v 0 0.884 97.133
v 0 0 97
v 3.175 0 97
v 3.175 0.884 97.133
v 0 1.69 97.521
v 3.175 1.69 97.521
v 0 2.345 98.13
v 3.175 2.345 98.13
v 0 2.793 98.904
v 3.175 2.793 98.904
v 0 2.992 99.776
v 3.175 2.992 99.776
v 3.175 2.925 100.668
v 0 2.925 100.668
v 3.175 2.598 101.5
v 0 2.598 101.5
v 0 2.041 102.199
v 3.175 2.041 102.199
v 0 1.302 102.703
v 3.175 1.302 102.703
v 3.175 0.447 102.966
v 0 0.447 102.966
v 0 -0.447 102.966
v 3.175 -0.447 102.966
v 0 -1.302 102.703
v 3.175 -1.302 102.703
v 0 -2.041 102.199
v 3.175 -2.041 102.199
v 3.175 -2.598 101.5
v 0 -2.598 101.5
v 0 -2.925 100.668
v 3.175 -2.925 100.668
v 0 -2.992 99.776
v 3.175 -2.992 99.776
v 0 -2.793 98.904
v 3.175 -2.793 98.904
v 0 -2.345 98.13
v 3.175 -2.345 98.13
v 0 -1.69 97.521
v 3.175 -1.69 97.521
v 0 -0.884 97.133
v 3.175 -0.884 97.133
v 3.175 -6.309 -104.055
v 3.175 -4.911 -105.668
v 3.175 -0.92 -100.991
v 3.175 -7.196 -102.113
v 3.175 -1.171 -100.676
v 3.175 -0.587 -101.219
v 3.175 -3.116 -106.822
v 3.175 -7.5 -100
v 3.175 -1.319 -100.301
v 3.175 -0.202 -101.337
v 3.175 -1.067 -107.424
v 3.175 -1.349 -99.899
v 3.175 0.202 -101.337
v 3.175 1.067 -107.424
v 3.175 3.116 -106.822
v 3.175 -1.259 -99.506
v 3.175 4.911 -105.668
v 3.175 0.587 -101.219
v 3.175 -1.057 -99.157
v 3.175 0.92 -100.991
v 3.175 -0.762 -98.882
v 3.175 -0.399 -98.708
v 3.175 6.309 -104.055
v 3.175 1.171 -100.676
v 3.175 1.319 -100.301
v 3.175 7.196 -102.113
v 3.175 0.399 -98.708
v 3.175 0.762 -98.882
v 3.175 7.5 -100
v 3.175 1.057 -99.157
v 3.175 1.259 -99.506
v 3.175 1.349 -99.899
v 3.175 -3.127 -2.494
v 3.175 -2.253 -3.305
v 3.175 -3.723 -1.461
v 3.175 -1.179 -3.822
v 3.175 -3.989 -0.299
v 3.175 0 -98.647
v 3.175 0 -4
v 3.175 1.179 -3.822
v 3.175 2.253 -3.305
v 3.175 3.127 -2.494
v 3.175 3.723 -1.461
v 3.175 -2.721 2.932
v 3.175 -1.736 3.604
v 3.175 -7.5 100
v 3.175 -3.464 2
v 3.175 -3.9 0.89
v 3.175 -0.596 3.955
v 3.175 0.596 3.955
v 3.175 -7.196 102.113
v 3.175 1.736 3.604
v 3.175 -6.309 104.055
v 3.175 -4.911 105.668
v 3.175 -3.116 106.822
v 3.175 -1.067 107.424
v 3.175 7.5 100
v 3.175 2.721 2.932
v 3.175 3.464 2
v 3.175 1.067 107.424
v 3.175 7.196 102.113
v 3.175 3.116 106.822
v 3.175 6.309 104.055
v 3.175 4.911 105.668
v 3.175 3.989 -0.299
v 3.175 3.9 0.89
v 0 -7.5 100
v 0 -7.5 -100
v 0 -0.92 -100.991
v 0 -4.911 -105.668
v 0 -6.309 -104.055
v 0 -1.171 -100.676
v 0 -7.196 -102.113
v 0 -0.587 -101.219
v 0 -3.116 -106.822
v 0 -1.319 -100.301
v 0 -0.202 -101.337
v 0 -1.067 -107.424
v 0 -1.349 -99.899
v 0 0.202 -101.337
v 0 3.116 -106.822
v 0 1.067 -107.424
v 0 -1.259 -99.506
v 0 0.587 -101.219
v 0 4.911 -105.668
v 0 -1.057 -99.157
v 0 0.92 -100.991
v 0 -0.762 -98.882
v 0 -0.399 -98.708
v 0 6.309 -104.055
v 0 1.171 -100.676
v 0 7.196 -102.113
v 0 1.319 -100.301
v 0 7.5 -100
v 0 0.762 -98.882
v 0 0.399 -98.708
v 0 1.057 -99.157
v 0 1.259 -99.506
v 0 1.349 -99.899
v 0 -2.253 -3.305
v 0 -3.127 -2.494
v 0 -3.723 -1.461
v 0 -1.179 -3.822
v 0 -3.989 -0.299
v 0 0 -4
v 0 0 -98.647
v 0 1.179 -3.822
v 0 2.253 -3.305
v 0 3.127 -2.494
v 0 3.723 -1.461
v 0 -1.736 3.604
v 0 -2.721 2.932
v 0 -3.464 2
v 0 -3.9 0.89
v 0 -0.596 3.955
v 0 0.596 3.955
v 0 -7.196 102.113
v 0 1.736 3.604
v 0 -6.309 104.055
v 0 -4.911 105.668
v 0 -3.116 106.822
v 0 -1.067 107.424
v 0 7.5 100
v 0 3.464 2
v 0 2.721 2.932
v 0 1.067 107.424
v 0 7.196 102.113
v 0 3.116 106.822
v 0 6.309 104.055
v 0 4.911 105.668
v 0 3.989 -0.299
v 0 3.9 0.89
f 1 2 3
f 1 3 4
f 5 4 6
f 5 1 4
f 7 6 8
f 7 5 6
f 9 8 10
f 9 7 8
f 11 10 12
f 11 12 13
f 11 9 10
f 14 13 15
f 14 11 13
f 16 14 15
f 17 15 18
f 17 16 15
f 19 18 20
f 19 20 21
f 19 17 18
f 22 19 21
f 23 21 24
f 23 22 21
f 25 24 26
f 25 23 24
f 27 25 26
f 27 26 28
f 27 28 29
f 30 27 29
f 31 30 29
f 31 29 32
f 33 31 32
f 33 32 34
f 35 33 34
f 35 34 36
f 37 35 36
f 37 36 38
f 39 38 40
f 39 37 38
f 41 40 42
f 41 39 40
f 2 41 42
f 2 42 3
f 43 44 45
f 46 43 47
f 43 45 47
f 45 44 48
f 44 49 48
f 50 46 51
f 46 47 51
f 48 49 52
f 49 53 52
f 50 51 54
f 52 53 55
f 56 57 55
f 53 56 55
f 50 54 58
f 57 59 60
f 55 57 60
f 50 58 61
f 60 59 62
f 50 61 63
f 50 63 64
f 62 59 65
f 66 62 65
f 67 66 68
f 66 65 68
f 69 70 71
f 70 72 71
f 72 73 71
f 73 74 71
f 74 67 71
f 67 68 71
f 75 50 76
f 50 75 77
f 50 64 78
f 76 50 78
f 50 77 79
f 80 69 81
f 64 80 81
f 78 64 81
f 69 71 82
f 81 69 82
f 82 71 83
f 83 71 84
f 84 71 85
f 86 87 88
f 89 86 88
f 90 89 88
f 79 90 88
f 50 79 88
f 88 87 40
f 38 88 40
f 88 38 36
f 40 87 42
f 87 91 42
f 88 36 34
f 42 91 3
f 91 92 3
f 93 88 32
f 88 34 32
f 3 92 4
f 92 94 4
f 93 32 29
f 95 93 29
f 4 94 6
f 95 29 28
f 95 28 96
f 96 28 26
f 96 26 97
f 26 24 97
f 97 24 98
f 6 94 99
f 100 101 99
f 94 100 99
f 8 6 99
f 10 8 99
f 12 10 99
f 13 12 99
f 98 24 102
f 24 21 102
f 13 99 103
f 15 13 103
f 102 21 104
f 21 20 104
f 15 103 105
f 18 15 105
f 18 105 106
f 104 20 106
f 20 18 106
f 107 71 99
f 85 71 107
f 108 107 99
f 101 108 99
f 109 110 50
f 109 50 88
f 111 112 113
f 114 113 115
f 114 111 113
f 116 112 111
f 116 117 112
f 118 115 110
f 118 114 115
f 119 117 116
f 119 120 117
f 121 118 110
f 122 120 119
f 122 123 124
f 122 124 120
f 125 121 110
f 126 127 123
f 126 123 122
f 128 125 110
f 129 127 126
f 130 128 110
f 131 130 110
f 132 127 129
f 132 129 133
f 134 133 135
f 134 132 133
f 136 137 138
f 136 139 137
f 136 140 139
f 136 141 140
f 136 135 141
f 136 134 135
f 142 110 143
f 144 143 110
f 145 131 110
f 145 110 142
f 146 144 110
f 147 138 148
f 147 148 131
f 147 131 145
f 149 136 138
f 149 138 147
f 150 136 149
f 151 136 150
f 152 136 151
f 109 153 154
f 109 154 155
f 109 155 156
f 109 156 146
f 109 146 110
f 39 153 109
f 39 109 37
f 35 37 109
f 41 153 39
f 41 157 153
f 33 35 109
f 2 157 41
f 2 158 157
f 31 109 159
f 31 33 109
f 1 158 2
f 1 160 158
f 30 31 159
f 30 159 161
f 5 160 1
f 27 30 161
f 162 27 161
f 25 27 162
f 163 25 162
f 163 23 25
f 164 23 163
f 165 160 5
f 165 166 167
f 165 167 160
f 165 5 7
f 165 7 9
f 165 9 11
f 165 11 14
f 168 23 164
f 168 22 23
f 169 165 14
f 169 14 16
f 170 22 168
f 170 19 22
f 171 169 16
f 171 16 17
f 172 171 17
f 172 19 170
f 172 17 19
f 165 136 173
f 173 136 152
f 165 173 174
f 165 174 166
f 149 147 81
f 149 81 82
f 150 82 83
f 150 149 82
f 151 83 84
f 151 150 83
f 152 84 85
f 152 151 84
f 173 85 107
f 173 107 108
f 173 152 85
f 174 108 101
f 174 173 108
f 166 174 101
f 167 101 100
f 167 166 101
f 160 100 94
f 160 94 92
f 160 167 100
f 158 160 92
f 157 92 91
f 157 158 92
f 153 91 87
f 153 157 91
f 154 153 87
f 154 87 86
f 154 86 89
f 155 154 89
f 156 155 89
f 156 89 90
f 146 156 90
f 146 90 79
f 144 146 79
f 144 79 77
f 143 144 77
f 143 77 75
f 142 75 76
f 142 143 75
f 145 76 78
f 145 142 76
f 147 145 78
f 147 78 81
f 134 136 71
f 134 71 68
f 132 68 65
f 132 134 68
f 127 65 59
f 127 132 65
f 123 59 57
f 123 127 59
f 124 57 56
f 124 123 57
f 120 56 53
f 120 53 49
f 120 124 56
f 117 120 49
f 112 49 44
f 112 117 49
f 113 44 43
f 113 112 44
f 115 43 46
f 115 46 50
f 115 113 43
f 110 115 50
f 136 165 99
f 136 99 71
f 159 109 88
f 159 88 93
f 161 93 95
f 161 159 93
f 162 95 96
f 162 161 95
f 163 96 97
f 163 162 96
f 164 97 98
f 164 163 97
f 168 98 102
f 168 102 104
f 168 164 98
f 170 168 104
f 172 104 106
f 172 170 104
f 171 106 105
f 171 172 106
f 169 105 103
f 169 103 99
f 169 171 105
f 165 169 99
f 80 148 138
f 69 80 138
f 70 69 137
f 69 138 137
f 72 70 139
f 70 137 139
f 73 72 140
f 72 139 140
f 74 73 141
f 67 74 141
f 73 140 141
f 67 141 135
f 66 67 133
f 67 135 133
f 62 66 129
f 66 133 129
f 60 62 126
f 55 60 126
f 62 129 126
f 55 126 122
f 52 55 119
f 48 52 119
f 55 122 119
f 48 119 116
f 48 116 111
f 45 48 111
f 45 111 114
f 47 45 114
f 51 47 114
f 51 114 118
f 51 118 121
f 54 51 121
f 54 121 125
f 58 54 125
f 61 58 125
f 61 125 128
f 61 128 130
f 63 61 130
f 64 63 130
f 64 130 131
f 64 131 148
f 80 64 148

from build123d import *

# Parameters (mm, degrees)
SKETCH1_R             = 3
SKETCH1_R_2           = 4
BOSS_EXTRUDE1_DEPTH   = 3.175
F_6_32_TAPPED_HOLE1_D = 2.7051


with BuildPart() as part:
    # Sketch1 → Boss-Extrude1 (new body)
    with BuildSketch(Plane(origin=(0, 0, 0), x_dir=(0, 0, -1), z_dir=(1, 0, 0))):
        with BuildLine():
            Line((-100, 7.5), (100, 7.5))
            ThreePointArc((100, 7.5), (107.5, 0), (100, -7.5))
            Line((100, -7.5), (-100, -7.5))
            ThreePointArc((-100, -7.5), (-107.5, 0), (-100, 7.5))
        make_face()
        with Locations((-100, 0)):
            Circle(SKETCH1_R, mode=Mode.SUBTRACT)
        Circle(SKETCH1_R_2, mode=Mode.SUBTRACT)
    extrude(amount=BOSS_EXTRUDE1_DEPTH)

    # #6-32 Tapped Hole1 (through all)
    with Locations(Plane(origin=(3.175, 0, 0), x_dir=(0, 0, -1), z_dir=(1, 0, 0))):
        with Locations((100, 0)):
            Hole(F_6_32_TAPPED_HOLE1_D / 2)


solid = part.part
